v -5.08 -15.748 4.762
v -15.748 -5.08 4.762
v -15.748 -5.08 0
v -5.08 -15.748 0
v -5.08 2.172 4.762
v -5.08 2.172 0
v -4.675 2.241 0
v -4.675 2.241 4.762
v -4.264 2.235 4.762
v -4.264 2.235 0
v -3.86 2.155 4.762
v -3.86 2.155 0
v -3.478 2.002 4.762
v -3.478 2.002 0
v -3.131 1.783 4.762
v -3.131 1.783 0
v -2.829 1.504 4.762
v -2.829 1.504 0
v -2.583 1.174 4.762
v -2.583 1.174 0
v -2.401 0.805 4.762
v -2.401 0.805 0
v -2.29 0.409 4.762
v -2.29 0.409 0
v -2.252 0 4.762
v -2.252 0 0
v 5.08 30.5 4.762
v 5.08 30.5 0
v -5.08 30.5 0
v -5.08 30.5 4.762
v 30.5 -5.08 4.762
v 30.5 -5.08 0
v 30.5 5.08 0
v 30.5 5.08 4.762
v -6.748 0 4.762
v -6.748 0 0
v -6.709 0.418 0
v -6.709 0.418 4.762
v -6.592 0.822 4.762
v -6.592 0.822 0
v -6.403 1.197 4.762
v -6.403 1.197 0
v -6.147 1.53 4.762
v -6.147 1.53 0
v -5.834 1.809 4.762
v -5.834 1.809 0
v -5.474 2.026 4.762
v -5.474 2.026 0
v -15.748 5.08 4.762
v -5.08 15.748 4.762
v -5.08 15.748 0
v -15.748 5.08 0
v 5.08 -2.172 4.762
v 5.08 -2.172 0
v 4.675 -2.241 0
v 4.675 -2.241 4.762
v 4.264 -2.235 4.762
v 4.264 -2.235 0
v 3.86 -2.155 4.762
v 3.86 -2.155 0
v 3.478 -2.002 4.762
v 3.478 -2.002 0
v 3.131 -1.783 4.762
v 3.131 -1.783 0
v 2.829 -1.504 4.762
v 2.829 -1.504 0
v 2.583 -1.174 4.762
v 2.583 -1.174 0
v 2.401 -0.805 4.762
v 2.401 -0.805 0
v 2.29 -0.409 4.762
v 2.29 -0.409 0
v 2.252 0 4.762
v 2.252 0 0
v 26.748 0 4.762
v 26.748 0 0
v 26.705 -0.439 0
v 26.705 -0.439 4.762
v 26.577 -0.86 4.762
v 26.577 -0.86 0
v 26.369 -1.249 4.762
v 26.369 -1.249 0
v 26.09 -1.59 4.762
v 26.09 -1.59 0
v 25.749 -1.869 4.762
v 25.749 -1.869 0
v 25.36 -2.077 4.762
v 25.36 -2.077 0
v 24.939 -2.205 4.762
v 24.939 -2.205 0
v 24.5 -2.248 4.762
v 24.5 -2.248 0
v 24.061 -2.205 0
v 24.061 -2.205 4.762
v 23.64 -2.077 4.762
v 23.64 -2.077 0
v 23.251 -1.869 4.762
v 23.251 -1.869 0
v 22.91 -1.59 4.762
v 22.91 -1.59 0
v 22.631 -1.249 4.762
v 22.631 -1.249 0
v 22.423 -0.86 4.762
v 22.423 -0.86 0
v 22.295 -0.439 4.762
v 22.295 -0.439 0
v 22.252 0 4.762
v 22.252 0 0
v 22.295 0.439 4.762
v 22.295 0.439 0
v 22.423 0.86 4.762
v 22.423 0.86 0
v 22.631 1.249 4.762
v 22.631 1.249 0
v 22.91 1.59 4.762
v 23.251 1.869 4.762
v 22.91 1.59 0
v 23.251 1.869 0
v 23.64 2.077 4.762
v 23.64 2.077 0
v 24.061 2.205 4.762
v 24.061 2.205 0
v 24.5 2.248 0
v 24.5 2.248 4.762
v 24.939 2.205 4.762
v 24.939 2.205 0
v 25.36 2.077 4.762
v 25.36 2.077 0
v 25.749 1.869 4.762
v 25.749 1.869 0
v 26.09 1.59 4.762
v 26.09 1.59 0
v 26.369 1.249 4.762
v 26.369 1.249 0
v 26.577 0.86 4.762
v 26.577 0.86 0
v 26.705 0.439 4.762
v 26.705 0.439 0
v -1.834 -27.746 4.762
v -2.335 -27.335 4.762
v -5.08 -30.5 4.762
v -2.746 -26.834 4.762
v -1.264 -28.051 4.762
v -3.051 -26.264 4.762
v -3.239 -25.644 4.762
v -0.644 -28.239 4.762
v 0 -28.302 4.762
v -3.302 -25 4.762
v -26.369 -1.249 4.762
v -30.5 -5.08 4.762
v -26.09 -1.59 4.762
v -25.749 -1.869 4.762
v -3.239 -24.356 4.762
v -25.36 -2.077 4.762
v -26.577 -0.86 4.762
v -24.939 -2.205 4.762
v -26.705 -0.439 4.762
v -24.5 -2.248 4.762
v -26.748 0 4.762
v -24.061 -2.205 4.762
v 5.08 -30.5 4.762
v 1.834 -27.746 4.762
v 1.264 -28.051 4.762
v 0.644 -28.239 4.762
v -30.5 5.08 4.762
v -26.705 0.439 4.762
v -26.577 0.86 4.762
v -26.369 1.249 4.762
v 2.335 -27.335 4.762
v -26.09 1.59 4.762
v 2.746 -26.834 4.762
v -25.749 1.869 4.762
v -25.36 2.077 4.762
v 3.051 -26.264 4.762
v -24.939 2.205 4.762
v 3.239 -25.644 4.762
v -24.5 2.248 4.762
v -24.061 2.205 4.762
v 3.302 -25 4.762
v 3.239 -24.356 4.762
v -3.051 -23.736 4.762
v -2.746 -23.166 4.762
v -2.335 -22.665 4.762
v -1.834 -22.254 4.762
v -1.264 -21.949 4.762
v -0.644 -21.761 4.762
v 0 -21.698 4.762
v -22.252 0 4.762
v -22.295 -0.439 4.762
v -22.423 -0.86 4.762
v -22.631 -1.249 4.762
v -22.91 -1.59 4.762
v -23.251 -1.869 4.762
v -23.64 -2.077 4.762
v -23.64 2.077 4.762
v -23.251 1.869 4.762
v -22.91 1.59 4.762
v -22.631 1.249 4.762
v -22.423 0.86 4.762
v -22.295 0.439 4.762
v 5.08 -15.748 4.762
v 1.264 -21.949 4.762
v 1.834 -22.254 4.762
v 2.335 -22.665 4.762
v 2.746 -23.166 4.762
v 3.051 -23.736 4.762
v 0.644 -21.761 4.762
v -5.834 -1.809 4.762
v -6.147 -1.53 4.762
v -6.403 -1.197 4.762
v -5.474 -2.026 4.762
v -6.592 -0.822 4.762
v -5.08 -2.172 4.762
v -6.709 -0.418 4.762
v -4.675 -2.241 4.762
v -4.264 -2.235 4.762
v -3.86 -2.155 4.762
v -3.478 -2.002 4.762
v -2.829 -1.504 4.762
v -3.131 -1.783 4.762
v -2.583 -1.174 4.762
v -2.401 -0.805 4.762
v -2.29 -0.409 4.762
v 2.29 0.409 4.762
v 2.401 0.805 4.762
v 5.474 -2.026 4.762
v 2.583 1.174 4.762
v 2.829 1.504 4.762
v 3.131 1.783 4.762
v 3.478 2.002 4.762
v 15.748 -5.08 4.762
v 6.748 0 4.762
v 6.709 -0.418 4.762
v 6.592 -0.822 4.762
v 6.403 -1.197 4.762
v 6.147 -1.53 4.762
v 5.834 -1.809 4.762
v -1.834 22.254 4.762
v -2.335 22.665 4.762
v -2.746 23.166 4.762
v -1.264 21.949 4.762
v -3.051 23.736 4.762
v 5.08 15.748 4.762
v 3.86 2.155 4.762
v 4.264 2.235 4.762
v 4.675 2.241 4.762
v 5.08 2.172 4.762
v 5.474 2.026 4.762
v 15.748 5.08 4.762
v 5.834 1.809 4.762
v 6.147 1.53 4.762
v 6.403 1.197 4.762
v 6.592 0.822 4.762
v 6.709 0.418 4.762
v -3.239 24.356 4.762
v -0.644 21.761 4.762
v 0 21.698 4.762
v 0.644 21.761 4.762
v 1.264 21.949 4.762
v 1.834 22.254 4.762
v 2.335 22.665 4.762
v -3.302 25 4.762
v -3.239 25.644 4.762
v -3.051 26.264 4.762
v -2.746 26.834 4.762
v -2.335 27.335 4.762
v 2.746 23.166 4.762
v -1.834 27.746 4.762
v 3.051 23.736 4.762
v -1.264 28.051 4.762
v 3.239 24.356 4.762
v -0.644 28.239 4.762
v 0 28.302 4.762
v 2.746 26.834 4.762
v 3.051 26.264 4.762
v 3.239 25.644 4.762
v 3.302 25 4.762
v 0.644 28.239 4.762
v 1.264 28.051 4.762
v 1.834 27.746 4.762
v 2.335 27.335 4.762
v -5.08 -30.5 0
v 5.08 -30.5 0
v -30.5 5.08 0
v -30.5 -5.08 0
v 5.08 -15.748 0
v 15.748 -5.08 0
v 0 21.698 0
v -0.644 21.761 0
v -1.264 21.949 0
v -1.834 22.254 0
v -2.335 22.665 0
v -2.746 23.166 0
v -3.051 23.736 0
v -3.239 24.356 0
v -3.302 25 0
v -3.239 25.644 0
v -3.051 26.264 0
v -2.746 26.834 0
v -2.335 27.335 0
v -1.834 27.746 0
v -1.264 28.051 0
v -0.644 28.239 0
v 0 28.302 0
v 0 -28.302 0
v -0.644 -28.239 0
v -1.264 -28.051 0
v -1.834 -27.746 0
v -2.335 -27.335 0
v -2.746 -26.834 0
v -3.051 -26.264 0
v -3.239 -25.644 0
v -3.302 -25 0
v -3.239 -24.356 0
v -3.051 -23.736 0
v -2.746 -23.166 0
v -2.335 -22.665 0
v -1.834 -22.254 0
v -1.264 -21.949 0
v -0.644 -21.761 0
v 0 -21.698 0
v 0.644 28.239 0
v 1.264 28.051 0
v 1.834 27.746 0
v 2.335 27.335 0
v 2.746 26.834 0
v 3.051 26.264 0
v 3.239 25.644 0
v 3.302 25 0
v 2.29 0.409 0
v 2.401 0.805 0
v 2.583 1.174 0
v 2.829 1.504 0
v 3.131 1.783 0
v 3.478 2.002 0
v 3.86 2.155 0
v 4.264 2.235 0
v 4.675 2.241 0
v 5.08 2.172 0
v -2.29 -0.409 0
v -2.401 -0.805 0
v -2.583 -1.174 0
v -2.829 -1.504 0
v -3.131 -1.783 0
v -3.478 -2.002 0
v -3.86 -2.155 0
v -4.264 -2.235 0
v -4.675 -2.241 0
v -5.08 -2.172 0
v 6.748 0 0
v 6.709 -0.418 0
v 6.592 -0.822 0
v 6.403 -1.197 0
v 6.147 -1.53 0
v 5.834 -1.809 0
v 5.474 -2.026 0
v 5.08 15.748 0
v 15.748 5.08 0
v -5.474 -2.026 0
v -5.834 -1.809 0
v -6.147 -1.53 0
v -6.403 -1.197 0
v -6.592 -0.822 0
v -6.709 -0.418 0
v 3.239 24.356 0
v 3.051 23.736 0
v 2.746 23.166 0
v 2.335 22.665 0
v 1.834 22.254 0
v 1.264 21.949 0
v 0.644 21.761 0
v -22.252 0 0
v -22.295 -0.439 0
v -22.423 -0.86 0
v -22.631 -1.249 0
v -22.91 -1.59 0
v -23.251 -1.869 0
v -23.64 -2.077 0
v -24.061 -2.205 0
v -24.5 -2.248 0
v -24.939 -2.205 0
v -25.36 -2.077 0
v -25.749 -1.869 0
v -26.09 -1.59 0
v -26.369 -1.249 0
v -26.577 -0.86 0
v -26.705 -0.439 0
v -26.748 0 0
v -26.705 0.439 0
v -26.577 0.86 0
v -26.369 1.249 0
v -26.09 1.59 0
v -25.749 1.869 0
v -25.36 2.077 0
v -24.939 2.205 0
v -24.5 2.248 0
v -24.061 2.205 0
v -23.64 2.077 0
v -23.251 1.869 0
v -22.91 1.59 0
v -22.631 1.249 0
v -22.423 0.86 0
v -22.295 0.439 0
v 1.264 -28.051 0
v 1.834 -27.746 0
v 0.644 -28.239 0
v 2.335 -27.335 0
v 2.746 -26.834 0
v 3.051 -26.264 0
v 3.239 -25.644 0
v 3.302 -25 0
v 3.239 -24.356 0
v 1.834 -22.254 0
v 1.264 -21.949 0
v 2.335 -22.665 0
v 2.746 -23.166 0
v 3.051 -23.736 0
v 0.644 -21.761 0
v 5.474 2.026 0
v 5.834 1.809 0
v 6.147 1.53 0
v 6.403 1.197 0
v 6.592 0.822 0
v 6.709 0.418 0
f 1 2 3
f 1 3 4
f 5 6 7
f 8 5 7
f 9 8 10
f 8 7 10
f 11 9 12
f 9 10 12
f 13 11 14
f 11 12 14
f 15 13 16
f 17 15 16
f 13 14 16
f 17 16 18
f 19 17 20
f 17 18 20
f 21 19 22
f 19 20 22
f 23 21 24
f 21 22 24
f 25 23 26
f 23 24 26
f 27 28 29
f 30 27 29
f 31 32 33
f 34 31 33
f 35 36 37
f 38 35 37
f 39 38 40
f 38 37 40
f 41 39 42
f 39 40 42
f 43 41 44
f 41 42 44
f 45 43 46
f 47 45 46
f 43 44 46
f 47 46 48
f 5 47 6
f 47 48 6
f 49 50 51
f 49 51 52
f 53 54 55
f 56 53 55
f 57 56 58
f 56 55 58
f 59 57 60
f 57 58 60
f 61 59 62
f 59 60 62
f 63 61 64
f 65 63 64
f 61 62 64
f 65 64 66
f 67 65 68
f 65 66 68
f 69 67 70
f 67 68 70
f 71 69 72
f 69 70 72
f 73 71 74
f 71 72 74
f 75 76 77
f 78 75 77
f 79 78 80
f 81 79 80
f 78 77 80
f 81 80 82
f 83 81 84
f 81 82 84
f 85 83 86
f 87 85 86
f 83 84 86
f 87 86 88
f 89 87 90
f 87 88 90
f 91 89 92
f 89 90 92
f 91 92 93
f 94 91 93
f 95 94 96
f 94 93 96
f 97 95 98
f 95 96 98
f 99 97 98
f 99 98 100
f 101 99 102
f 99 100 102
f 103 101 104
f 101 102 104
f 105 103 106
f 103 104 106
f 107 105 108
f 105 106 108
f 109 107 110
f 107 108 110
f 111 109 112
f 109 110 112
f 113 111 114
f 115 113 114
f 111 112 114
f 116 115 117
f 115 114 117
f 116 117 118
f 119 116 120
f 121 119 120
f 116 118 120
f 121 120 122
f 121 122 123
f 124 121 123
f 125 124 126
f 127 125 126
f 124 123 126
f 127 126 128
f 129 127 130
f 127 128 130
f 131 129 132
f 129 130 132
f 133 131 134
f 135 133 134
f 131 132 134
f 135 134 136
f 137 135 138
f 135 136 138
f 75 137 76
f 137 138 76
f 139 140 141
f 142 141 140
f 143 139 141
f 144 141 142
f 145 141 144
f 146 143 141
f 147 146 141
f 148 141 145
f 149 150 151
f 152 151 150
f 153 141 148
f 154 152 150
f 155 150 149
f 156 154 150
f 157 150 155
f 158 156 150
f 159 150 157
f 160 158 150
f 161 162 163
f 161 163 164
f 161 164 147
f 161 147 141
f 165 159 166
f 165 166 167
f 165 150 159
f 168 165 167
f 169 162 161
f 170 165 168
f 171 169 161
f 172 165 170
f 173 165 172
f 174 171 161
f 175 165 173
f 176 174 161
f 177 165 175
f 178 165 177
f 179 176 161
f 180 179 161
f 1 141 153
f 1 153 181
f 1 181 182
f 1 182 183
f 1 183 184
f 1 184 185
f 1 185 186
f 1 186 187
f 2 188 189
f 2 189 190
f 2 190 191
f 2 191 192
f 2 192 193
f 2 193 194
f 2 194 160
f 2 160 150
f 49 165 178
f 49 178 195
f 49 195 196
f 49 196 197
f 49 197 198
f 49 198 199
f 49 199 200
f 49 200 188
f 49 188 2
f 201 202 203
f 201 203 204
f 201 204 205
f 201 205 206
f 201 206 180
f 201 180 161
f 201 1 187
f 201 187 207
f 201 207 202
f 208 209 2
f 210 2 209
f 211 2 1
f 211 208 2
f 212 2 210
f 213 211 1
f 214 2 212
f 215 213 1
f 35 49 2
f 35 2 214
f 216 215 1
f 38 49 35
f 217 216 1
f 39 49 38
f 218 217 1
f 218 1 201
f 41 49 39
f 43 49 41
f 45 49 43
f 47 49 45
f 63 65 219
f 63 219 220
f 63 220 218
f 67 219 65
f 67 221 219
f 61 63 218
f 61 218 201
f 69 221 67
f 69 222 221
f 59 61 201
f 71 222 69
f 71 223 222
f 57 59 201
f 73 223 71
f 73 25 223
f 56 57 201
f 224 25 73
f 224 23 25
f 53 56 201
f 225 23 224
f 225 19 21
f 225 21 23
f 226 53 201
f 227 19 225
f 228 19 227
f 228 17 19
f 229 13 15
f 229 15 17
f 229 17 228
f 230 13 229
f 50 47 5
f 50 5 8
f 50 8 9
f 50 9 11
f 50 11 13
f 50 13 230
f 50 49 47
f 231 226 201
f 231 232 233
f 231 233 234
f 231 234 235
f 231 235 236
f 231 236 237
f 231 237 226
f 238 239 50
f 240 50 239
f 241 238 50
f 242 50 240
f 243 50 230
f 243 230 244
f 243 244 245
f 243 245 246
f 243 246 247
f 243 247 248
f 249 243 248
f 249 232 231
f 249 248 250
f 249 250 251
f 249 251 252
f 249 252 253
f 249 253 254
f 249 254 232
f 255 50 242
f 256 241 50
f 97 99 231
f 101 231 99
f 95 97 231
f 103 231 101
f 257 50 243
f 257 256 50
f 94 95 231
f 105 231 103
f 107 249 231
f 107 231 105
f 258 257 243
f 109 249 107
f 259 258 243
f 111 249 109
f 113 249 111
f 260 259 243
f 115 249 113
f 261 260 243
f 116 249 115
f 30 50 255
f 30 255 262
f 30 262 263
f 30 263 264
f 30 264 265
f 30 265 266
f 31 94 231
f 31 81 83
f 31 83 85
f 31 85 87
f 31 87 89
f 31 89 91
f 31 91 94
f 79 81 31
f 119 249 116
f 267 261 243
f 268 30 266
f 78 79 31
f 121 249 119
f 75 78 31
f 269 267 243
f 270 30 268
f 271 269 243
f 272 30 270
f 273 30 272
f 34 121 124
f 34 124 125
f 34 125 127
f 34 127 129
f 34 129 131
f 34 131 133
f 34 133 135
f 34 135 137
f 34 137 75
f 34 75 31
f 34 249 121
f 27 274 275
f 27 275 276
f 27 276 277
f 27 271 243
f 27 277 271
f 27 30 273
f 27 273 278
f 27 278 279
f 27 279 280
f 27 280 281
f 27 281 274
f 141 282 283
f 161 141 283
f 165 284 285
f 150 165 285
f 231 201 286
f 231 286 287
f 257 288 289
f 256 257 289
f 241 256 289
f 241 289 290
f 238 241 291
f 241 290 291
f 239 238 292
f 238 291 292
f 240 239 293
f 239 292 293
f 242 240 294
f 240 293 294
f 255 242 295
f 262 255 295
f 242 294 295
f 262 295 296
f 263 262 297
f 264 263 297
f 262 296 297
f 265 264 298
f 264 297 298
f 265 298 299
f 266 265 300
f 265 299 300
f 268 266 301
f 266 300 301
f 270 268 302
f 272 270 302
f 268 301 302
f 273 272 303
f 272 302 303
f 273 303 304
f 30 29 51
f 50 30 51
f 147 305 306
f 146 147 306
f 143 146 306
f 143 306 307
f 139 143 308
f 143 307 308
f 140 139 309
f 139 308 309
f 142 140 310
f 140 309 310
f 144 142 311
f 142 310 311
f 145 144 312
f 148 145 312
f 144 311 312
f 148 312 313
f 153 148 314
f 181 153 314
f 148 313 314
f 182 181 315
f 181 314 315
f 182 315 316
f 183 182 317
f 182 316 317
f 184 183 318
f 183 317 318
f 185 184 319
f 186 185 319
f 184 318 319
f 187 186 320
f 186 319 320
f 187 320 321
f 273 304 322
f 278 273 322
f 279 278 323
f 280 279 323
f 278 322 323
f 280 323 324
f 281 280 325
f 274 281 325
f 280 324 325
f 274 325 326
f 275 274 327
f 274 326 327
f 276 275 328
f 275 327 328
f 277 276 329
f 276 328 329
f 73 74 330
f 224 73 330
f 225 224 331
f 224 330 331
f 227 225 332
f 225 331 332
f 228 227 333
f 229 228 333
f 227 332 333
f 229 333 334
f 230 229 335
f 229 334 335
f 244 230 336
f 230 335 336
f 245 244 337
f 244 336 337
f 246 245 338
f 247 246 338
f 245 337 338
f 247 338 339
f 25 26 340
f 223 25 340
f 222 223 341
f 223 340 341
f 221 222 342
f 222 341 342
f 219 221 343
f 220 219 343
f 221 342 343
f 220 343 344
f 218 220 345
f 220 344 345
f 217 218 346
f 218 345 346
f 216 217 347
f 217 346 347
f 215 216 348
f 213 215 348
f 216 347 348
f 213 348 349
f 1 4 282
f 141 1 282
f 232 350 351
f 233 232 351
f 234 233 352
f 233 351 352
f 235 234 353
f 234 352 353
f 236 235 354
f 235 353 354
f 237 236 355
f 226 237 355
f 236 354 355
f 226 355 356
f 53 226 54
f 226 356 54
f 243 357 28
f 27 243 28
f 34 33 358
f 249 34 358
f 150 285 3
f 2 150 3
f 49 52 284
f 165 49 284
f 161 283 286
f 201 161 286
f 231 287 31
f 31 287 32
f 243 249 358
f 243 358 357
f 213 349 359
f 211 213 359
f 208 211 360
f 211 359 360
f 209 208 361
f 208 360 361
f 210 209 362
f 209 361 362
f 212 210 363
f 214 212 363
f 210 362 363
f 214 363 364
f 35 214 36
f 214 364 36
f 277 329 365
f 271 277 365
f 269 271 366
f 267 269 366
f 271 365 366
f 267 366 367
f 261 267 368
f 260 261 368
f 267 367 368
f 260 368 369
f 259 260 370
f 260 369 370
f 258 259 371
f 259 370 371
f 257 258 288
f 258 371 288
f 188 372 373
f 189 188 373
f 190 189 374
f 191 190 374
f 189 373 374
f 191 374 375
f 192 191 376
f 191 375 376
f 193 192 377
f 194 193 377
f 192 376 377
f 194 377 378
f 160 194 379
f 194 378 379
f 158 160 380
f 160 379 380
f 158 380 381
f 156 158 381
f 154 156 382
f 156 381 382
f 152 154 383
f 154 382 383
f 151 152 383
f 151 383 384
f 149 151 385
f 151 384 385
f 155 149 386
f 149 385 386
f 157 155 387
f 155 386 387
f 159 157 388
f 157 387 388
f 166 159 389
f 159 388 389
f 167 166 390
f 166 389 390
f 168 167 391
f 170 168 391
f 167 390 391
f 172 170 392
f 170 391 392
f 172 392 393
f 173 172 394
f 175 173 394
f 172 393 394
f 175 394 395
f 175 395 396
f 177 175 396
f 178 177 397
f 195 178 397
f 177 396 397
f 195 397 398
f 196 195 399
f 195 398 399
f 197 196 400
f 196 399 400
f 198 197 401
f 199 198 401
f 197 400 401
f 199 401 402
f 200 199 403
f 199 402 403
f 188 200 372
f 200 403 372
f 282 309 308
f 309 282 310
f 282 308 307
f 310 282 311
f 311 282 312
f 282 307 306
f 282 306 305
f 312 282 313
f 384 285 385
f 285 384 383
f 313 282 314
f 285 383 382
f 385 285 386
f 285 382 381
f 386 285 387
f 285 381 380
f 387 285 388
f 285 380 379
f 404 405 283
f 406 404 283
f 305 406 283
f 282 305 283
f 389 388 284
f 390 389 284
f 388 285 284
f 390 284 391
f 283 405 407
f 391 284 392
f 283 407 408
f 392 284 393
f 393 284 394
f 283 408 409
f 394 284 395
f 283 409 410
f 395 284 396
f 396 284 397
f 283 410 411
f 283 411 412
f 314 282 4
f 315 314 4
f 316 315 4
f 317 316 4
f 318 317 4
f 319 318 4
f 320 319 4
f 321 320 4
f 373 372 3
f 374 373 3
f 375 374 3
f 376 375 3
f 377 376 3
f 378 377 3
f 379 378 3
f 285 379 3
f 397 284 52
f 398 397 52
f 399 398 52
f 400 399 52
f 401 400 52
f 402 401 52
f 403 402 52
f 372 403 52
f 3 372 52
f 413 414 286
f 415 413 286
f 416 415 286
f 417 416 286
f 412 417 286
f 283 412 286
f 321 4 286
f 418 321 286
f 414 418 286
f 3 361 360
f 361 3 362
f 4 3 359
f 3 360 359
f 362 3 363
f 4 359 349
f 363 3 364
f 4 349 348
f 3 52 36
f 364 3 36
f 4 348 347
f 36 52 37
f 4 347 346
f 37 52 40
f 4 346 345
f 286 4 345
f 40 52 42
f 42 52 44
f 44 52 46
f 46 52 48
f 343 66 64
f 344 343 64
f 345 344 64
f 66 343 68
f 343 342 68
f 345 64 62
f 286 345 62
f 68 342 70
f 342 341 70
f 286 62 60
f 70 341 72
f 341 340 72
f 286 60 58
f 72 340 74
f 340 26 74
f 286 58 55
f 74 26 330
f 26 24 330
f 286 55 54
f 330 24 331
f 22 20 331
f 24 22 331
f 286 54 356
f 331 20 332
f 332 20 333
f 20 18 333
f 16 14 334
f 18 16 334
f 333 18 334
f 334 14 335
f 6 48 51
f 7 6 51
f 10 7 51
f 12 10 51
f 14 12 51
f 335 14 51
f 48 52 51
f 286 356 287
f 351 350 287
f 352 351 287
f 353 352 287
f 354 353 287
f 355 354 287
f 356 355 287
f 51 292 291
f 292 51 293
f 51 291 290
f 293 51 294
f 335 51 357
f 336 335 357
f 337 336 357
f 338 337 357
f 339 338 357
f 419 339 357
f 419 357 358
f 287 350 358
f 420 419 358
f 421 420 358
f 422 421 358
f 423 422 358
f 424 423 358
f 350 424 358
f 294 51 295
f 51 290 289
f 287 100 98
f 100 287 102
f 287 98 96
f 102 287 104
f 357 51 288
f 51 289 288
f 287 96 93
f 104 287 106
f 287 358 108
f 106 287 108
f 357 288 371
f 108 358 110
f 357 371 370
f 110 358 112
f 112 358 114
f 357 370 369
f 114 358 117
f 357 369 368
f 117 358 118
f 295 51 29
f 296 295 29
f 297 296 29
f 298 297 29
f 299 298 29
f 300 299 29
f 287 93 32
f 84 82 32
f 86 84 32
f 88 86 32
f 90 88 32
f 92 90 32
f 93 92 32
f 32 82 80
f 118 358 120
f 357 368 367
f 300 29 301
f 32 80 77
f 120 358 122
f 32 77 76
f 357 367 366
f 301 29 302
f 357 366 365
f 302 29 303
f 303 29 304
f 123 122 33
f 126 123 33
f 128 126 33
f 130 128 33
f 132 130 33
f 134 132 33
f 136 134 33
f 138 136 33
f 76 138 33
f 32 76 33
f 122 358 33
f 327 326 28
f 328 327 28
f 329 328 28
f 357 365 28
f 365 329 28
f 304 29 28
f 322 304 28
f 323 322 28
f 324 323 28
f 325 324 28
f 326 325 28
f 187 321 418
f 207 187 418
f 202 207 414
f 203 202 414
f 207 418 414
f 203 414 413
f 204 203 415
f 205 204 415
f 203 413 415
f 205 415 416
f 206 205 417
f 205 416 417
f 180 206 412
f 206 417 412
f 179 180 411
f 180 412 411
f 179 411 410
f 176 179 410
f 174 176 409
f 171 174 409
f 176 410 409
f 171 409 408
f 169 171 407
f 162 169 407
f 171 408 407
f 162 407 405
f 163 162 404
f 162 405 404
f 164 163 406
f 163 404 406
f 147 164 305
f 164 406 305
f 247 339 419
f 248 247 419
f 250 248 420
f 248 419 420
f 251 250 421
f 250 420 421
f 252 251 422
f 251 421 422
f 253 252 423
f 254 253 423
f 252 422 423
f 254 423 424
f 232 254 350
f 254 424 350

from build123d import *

# Parameters (mm, degrees)
BOSS_EXTRUDE5_DEPTH = 4.7625
BOSS_EXTRUDE6_DEPTH = 4.7625


with BuildPart() as part:
    # Sketch1 → Boss-Extrude5 (new body)
    with BuildSketch(Plane.XY):
        with BuildLine():
            Line((0, 28.302), (0, 30.5))
            Line((0, 30.5), (-5.08, 30.5))
            Line((-5.08, 30.5), (-5.08, 5.08))
            Line((-5.08, 5.08), (0, 5.08))
            Line((0, 5.08), (0, 21.698))
            ThreePointArc((0, 21.698), (-3.302, 25), (0, 28.302))
        make_face()
        with BuildLine():
            Line((5.08, 30.5), (0, 30.5))
            Line((0, 30.5), (0, 28.302))
            ThreePointArc((0, 28.302), (2.334866591, 27.334866591), (3.302, 25))
            ThreePointArc((3.302, 25), (2.334866591, 22.665133409), (0, 21.698))
            Line((0, 21.698), (0, 5.08))
            Line((0, 5.08), (5.08, 5.08))
            Line((5.08, 5.08), (5.08, 30.5))
        make_face()
        with BuildLine():
            Line((30.5, 5.08), (5.08, 5.08))
            Line((5.08, 5.08), (5.08, 2.171785995))
            ThreePointArc((5.08, 2.171785995), (6.282811882, 1.369173548), (6.7479, 0))
            Line((6.7479, 0), (22.2521, 0))
            ThreePointArc((22.2521, 0), (24.5, 2.2479), (26.7479, 0))
            Line((26.7479, 0), (30.5, 0))
            Line((30.5, 0), (30.5, 5.08))
        make_face()
        with BuildLine():
            Line((22.2521, 0), (6.7479, 0))
            ThreePointArc((6.7479, 0), (6.282811882, -1.369173548), (5.08, -2.171785995))
            Line((5.08, -2.171785995), (5.08, -5.08))
            Line((5.08, -5.08), (30.5, -5.08))
            Line((30.5, -5.08), (30.5, 0))
            Line((30.5, 0), (26.7479, 0))
            ThreePointArc((26.7479, 0), (24.5, -2.2479), (22.2521, 0))
        make_face()
        with BuildLine():
            Line((2.2521, 0), (0, 0))
            Line((0, 0), (0, -5.08))
            Line((0, -5.08), (5.08, -5.08))
            Line((5.08, -5.08), (5.08, -2.171785995))
            ThreePointArc((5.08, -2.171785995), (3.130826452, -1.782811882), (2.2521, 0))
        make_face()
        with BuildLine():
            Line((0, -5.08), (0, 0))
            Line((0, 0), (-2.2521, 0))
            ThreePointArc((-2.2521, 0), (-3.130826452, -1.782811882), (-5.08, -2.171785995))
            Line((-5.08, -2.171785995), (-5.08, -5.08))
            Line((-5.08, -5.08), (0, -5.08))
        make_face()
        with BuildLine():
            Line((5.08, 2.171785995), (5.08, 5.08))
            Line((5.08, 5.08), (0, 5.08))
            Line((0, 5.08), (0, 0))
            Line((0, 0), (2.2521, 0))
            ThreePointArc((2.2521, 0), (3.130826452, 1.782811882), (5.08, 2.171785995))
        make_face()
        with BuildLine():
            Line((0, 5.08), (-5.08, 5.08))
            Line((-5.08, 5.08), (-5.08, 2.171785995))
            ThreePointArc((-5.08, 2.171785995), (-3.130826452, 1.782811882), (-2.2521, 0))
            Line((-2.2521, 0), (0, 0))
            Line((0, 0), (0, 5.08))
        make_face()
        with BuildLine():
            Line((-5.08, 2.171785995), (-5.08, 5.08))
            Line((-5.08, 5.08), (-30.5, 5.08))
            Line((-30.5, 5.08), (-30.5, 0))
            Line((-30.5, 0), (-26.7479, 0))
            ThreePointArc((-26.7479, 0), (-24.5, 2.2479), (-22.2521, 0))
            Line((-22.2521, 0), (-6.7479, 0))
            ThreePointArc((-6.7479, 0), (-6.282811882, 1.369173548), (-5.08, 2.171785995))
        make_face()
        with BuildLine():
            ThreePointArc((-5.08, -2.171785995), (-6.282811882, -1.369173548), (-6.7479, 0))
            Line((-6.7479, 0), (-22.2521, 0))
            ThreePointArc((-22.2521, 0), (-24.5, -2.2479), (-26.7479, 0))
            Line((-26.7479, 0), (-30.5, 0))
            Line((-30.5, 0), (-30.5, -5.08))
            Line((-30.5, -5.08), (-5.08, -5.08))
            Line((-5.08, -5.08), (-5.08, -2.171785995))
        make_face()
        with BuildLine():
            Line((0, -21.698), (0, -5.08))
            Line((0, -5.08), (-5.08, -5.08))
            Line((-5.08, -5.08), (-5.08, -30.5))
            Line((-5.08, -30.5), (0, -30.5))
            Line((0, -30.5), (0, -28.302))
            ThreePointArc((0, -28.302), (-3.302, -25), (0, -21.698))
        make_face()
        with BuildLine():
            Line((5.08, -5.08), (0, -5.08))
            Line((0, -5.08), (0, -21.698))
            ThreePointArc((0, -21.698), (2.334866591, -22.665133409), (3.302, -25))
            ThreePointArc((3.302, -25), (2.334866591, -27.334866591), (0, -28.302))
            Line((0, -28.302), (0, -30.5))
            Line((0, -30.5), (5.08, -30.5))
            Line((5.08, -30.5), (5.08, -5.08))
        make_face()
    extrude(amount=BOSS_EXTRUDE5_DEPTH)

    # Sketch3 → Boss-Extrude6 (add)
    with BuildSketch(Plane.XY.offset(4.7625)):
        Polygon((5.08, 5.08), (15.748, 5.08), (5.08, 15.748), align=None)
        Polygon((5.08, -5.08), (5.08, -15.748), (15.748, -5.08), align=None)
        Polygon((-5.08, -5.08), (-15.748, -5.08), (-5.08, -15.748), align=None)
        Polygon((-15.748, 5.08), (-5.08, 5.08), (-5.08, 15.748), align=None)
    extrude(amount=-BOSS_EXTRUDE6_DEPTH)


solid = part.part
